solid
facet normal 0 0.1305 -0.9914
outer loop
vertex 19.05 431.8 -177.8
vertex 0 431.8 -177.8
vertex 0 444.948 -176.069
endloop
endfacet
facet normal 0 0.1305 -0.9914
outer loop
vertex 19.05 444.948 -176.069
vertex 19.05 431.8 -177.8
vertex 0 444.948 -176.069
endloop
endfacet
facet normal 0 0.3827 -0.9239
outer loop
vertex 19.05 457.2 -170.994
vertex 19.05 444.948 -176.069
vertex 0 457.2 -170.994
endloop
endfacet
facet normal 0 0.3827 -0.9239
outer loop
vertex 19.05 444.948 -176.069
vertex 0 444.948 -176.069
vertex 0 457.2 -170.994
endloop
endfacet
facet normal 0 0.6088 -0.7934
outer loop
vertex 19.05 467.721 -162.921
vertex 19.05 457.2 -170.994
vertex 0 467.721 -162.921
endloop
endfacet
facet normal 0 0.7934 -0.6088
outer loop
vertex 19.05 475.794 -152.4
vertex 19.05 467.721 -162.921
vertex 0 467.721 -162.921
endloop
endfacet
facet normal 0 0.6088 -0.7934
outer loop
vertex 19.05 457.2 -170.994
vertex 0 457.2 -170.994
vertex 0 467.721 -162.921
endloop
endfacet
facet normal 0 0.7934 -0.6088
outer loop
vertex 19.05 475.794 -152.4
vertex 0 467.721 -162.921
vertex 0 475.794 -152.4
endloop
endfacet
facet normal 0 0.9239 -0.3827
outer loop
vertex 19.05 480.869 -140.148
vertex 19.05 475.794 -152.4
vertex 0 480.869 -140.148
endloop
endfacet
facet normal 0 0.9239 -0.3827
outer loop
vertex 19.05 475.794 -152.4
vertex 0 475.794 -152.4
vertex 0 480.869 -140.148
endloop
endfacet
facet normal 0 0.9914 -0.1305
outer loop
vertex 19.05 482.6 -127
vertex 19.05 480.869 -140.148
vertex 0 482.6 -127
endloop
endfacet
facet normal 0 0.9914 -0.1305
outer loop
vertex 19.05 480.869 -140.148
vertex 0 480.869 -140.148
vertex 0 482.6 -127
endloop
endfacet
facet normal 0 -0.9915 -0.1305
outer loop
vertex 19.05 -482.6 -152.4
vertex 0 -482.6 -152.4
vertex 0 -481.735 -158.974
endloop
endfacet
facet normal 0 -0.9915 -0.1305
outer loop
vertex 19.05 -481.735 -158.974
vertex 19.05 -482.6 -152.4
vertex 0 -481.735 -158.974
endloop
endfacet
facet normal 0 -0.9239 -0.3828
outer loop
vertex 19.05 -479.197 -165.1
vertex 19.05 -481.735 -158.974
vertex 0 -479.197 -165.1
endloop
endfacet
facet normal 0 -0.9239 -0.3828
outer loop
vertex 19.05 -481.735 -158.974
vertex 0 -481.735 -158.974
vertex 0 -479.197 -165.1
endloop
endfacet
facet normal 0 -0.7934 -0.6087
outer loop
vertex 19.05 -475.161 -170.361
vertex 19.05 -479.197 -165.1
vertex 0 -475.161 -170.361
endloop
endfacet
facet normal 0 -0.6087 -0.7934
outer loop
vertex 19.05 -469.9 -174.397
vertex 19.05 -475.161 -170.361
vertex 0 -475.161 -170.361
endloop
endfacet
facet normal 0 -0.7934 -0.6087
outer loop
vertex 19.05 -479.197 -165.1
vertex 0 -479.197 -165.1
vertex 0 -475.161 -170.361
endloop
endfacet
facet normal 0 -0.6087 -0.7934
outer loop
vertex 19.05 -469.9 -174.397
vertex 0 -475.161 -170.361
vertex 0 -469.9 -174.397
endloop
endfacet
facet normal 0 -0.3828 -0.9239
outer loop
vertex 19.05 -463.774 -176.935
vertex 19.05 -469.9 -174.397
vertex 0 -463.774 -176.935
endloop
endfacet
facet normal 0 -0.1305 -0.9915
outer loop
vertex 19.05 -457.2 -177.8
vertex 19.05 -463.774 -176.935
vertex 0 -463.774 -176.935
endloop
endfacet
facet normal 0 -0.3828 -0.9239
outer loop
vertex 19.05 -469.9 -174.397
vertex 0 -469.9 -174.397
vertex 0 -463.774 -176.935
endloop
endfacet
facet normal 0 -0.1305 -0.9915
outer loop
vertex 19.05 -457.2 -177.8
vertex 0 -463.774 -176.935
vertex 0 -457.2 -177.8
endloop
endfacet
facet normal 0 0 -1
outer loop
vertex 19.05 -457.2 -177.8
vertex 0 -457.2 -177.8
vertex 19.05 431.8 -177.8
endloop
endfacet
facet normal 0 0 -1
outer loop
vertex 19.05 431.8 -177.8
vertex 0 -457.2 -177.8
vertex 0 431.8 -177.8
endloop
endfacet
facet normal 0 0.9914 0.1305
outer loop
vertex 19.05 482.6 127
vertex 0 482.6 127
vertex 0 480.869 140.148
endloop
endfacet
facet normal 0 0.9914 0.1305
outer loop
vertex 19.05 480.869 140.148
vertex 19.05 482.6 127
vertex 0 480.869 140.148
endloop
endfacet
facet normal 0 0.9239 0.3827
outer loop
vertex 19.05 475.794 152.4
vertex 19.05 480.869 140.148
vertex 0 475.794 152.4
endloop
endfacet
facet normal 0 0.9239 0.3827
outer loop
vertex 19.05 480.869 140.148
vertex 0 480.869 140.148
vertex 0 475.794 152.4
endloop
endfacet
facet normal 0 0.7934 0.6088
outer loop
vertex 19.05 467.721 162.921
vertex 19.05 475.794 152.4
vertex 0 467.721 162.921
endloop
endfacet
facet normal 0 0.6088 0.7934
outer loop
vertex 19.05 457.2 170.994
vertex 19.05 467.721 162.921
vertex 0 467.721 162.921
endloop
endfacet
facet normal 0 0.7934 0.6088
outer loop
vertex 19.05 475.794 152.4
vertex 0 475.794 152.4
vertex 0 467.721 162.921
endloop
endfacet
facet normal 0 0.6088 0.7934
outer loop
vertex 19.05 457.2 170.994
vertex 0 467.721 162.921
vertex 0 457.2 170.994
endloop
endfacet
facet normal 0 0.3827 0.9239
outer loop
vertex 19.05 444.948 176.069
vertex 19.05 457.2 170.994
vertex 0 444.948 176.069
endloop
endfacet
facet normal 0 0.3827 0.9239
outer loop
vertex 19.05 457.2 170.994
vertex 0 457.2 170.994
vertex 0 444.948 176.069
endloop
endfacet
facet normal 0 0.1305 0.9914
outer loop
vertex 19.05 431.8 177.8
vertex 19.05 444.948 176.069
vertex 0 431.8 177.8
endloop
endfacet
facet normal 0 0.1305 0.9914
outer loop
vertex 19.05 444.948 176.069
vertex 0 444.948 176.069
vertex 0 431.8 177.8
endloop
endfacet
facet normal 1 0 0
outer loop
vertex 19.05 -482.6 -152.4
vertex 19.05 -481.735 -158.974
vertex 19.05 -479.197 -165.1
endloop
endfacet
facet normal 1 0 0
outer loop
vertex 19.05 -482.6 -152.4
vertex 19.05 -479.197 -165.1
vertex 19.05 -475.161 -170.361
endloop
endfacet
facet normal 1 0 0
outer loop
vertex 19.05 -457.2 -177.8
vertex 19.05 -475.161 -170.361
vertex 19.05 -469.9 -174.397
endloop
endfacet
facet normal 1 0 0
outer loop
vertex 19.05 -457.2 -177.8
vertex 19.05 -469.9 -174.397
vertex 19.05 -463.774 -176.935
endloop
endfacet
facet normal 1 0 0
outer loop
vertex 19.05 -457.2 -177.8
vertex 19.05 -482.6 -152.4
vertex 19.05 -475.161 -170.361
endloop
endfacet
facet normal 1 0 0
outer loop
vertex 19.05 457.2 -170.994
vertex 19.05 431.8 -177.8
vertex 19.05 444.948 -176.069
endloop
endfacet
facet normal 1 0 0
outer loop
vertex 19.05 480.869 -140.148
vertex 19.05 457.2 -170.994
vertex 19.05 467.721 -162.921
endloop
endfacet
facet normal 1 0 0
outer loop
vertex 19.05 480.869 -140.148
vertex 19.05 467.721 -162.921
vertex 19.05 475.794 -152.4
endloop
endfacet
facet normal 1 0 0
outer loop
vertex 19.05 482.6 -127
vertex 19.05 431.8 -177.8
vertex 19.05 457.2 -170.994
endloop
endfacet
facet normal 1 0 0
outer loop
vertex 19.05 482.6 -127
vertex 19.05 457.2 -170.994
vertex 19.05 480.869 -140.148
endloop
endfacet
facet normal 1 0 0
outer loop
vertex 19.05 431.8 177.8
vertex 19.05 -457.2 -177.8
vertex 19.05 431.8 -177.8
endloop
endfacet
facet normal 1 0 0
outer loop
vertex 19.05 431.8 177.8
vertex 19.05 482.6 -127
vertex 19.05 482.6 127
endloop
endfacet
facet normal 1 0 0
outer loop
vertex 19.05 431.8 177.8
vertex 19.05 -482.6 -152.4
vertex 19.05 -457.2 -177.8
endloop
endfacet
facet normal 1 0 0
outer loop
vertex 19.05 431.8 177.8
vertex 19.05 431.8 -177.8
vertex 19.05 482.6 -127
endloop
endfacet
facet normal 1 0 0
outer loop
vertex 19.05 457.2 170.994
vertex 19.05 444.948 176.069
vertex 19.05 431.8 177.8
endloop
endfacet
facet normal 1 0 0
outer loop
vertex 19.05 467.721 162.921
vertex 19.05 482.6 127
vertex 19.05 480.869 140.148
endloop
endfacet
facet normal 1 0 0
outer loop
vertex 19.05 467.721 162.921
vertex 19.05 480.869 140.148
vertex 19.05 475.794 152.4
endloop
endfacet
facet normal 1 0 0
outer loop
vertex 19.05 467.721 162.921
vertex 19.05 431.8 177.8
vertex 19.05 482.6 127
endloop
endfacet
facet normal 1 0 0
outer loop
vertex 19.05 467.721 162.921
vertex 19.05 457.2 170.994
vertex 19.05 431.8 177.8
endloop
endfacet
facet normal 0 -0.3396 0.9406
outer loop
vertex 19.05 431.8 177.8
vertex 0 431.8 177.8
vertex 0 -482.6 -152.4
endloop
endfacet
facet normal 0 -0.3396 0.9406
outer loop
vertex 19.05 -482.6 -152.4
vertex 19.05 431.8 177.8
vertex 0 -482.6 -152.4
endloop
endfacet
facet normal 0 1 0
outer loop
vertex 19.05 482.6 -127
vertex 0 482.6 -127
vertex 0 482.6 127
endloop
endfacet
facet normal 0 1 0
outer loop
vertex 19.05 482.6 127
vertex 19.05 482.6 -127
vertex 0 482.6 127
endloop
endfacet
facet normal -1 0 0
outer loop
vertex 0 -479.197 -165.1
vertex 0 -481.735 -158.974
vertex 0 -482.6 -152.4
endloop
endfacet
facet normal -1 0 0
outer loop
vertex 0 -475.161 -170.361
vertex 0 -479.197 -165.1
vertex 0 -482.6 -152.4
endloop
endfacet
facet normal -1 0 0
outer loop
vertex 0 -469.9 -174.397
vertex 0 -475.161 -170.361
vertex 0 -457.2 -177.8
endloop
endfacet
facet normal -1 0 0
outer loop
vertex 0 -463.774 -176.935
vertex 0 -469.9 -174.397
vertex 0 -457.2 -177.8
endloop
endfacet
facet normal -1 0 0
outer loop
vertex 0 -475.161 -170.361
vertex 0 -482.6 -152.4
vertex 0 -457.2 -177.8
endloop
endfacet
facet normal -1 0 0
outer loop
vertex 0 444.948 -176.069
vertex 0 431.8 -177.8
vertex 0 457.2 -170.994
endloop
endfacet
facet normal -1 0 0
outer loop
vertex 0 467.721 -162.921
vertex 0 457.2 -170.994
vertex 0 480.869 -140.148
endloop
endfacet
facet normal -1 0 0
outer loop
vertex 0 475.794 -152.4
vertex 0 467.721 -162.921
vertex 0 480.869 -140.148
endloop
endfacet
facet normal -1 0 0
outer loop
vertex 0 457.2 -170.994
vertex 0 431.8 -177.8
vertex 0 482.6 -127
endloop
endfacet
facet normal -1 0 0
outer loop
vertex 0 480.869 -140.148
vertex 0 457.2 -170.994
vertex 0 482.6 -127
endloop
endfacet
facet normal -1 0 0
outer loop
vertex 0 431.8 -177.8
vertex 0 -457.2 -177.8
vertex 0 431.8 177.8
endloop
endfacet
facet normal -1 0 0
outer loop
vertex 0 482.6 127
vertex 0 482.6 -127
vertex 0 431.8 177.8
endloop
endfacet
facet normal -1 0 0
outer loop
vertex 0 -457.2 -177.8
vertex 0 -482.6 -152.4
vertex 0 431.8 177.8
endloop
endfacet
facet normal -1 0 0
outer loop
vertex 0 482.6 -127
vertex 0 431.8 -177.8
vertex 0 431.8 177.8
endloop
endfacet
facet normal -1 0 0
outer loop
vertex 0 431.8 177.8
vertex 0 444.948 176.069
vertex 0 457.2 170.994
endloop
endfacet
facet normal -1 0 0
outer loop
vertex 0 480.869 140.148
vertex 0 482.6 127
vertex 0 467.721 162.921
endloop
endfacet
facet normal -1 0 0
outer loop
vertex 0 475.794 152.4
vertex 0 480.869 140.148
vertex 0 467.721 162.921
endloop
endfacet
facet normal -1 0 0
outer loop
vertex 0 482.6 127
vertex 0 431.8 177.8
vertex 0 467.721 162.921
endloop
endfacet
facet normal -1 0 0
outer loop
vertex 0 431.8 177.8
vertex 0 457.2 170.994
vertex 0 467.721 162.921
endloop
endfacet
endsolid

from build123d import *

# Parameters (mm, degrees)
F1_DEPTH = 19.05


with BuildPart() as f1:
    # F0 (on Right) → F1 (new body)
    with BuildSketch(Plane.YZ):
        with BuildLine():
            ThreePointArc((482.6, 127), (467.721024, 162.921024), (431.8, 177.8))
            Line((431.8, 177.8), (-482.6, -152.4))
            ThreePointArc((-482.6, -152.4), (-475.160512, -170.360512), (-457.2, -177.8))
            Line((-457.2, -177.8), (431.8, -177.8))
            ThreePointArc((431.8, -177.8), (467.721024, -162.921024), (482.6, -127))
            Line((482.6, -127), (482.6, 127))
        make_face()
    extrude(amount=F1_DEPTH)


solid = f1.part
